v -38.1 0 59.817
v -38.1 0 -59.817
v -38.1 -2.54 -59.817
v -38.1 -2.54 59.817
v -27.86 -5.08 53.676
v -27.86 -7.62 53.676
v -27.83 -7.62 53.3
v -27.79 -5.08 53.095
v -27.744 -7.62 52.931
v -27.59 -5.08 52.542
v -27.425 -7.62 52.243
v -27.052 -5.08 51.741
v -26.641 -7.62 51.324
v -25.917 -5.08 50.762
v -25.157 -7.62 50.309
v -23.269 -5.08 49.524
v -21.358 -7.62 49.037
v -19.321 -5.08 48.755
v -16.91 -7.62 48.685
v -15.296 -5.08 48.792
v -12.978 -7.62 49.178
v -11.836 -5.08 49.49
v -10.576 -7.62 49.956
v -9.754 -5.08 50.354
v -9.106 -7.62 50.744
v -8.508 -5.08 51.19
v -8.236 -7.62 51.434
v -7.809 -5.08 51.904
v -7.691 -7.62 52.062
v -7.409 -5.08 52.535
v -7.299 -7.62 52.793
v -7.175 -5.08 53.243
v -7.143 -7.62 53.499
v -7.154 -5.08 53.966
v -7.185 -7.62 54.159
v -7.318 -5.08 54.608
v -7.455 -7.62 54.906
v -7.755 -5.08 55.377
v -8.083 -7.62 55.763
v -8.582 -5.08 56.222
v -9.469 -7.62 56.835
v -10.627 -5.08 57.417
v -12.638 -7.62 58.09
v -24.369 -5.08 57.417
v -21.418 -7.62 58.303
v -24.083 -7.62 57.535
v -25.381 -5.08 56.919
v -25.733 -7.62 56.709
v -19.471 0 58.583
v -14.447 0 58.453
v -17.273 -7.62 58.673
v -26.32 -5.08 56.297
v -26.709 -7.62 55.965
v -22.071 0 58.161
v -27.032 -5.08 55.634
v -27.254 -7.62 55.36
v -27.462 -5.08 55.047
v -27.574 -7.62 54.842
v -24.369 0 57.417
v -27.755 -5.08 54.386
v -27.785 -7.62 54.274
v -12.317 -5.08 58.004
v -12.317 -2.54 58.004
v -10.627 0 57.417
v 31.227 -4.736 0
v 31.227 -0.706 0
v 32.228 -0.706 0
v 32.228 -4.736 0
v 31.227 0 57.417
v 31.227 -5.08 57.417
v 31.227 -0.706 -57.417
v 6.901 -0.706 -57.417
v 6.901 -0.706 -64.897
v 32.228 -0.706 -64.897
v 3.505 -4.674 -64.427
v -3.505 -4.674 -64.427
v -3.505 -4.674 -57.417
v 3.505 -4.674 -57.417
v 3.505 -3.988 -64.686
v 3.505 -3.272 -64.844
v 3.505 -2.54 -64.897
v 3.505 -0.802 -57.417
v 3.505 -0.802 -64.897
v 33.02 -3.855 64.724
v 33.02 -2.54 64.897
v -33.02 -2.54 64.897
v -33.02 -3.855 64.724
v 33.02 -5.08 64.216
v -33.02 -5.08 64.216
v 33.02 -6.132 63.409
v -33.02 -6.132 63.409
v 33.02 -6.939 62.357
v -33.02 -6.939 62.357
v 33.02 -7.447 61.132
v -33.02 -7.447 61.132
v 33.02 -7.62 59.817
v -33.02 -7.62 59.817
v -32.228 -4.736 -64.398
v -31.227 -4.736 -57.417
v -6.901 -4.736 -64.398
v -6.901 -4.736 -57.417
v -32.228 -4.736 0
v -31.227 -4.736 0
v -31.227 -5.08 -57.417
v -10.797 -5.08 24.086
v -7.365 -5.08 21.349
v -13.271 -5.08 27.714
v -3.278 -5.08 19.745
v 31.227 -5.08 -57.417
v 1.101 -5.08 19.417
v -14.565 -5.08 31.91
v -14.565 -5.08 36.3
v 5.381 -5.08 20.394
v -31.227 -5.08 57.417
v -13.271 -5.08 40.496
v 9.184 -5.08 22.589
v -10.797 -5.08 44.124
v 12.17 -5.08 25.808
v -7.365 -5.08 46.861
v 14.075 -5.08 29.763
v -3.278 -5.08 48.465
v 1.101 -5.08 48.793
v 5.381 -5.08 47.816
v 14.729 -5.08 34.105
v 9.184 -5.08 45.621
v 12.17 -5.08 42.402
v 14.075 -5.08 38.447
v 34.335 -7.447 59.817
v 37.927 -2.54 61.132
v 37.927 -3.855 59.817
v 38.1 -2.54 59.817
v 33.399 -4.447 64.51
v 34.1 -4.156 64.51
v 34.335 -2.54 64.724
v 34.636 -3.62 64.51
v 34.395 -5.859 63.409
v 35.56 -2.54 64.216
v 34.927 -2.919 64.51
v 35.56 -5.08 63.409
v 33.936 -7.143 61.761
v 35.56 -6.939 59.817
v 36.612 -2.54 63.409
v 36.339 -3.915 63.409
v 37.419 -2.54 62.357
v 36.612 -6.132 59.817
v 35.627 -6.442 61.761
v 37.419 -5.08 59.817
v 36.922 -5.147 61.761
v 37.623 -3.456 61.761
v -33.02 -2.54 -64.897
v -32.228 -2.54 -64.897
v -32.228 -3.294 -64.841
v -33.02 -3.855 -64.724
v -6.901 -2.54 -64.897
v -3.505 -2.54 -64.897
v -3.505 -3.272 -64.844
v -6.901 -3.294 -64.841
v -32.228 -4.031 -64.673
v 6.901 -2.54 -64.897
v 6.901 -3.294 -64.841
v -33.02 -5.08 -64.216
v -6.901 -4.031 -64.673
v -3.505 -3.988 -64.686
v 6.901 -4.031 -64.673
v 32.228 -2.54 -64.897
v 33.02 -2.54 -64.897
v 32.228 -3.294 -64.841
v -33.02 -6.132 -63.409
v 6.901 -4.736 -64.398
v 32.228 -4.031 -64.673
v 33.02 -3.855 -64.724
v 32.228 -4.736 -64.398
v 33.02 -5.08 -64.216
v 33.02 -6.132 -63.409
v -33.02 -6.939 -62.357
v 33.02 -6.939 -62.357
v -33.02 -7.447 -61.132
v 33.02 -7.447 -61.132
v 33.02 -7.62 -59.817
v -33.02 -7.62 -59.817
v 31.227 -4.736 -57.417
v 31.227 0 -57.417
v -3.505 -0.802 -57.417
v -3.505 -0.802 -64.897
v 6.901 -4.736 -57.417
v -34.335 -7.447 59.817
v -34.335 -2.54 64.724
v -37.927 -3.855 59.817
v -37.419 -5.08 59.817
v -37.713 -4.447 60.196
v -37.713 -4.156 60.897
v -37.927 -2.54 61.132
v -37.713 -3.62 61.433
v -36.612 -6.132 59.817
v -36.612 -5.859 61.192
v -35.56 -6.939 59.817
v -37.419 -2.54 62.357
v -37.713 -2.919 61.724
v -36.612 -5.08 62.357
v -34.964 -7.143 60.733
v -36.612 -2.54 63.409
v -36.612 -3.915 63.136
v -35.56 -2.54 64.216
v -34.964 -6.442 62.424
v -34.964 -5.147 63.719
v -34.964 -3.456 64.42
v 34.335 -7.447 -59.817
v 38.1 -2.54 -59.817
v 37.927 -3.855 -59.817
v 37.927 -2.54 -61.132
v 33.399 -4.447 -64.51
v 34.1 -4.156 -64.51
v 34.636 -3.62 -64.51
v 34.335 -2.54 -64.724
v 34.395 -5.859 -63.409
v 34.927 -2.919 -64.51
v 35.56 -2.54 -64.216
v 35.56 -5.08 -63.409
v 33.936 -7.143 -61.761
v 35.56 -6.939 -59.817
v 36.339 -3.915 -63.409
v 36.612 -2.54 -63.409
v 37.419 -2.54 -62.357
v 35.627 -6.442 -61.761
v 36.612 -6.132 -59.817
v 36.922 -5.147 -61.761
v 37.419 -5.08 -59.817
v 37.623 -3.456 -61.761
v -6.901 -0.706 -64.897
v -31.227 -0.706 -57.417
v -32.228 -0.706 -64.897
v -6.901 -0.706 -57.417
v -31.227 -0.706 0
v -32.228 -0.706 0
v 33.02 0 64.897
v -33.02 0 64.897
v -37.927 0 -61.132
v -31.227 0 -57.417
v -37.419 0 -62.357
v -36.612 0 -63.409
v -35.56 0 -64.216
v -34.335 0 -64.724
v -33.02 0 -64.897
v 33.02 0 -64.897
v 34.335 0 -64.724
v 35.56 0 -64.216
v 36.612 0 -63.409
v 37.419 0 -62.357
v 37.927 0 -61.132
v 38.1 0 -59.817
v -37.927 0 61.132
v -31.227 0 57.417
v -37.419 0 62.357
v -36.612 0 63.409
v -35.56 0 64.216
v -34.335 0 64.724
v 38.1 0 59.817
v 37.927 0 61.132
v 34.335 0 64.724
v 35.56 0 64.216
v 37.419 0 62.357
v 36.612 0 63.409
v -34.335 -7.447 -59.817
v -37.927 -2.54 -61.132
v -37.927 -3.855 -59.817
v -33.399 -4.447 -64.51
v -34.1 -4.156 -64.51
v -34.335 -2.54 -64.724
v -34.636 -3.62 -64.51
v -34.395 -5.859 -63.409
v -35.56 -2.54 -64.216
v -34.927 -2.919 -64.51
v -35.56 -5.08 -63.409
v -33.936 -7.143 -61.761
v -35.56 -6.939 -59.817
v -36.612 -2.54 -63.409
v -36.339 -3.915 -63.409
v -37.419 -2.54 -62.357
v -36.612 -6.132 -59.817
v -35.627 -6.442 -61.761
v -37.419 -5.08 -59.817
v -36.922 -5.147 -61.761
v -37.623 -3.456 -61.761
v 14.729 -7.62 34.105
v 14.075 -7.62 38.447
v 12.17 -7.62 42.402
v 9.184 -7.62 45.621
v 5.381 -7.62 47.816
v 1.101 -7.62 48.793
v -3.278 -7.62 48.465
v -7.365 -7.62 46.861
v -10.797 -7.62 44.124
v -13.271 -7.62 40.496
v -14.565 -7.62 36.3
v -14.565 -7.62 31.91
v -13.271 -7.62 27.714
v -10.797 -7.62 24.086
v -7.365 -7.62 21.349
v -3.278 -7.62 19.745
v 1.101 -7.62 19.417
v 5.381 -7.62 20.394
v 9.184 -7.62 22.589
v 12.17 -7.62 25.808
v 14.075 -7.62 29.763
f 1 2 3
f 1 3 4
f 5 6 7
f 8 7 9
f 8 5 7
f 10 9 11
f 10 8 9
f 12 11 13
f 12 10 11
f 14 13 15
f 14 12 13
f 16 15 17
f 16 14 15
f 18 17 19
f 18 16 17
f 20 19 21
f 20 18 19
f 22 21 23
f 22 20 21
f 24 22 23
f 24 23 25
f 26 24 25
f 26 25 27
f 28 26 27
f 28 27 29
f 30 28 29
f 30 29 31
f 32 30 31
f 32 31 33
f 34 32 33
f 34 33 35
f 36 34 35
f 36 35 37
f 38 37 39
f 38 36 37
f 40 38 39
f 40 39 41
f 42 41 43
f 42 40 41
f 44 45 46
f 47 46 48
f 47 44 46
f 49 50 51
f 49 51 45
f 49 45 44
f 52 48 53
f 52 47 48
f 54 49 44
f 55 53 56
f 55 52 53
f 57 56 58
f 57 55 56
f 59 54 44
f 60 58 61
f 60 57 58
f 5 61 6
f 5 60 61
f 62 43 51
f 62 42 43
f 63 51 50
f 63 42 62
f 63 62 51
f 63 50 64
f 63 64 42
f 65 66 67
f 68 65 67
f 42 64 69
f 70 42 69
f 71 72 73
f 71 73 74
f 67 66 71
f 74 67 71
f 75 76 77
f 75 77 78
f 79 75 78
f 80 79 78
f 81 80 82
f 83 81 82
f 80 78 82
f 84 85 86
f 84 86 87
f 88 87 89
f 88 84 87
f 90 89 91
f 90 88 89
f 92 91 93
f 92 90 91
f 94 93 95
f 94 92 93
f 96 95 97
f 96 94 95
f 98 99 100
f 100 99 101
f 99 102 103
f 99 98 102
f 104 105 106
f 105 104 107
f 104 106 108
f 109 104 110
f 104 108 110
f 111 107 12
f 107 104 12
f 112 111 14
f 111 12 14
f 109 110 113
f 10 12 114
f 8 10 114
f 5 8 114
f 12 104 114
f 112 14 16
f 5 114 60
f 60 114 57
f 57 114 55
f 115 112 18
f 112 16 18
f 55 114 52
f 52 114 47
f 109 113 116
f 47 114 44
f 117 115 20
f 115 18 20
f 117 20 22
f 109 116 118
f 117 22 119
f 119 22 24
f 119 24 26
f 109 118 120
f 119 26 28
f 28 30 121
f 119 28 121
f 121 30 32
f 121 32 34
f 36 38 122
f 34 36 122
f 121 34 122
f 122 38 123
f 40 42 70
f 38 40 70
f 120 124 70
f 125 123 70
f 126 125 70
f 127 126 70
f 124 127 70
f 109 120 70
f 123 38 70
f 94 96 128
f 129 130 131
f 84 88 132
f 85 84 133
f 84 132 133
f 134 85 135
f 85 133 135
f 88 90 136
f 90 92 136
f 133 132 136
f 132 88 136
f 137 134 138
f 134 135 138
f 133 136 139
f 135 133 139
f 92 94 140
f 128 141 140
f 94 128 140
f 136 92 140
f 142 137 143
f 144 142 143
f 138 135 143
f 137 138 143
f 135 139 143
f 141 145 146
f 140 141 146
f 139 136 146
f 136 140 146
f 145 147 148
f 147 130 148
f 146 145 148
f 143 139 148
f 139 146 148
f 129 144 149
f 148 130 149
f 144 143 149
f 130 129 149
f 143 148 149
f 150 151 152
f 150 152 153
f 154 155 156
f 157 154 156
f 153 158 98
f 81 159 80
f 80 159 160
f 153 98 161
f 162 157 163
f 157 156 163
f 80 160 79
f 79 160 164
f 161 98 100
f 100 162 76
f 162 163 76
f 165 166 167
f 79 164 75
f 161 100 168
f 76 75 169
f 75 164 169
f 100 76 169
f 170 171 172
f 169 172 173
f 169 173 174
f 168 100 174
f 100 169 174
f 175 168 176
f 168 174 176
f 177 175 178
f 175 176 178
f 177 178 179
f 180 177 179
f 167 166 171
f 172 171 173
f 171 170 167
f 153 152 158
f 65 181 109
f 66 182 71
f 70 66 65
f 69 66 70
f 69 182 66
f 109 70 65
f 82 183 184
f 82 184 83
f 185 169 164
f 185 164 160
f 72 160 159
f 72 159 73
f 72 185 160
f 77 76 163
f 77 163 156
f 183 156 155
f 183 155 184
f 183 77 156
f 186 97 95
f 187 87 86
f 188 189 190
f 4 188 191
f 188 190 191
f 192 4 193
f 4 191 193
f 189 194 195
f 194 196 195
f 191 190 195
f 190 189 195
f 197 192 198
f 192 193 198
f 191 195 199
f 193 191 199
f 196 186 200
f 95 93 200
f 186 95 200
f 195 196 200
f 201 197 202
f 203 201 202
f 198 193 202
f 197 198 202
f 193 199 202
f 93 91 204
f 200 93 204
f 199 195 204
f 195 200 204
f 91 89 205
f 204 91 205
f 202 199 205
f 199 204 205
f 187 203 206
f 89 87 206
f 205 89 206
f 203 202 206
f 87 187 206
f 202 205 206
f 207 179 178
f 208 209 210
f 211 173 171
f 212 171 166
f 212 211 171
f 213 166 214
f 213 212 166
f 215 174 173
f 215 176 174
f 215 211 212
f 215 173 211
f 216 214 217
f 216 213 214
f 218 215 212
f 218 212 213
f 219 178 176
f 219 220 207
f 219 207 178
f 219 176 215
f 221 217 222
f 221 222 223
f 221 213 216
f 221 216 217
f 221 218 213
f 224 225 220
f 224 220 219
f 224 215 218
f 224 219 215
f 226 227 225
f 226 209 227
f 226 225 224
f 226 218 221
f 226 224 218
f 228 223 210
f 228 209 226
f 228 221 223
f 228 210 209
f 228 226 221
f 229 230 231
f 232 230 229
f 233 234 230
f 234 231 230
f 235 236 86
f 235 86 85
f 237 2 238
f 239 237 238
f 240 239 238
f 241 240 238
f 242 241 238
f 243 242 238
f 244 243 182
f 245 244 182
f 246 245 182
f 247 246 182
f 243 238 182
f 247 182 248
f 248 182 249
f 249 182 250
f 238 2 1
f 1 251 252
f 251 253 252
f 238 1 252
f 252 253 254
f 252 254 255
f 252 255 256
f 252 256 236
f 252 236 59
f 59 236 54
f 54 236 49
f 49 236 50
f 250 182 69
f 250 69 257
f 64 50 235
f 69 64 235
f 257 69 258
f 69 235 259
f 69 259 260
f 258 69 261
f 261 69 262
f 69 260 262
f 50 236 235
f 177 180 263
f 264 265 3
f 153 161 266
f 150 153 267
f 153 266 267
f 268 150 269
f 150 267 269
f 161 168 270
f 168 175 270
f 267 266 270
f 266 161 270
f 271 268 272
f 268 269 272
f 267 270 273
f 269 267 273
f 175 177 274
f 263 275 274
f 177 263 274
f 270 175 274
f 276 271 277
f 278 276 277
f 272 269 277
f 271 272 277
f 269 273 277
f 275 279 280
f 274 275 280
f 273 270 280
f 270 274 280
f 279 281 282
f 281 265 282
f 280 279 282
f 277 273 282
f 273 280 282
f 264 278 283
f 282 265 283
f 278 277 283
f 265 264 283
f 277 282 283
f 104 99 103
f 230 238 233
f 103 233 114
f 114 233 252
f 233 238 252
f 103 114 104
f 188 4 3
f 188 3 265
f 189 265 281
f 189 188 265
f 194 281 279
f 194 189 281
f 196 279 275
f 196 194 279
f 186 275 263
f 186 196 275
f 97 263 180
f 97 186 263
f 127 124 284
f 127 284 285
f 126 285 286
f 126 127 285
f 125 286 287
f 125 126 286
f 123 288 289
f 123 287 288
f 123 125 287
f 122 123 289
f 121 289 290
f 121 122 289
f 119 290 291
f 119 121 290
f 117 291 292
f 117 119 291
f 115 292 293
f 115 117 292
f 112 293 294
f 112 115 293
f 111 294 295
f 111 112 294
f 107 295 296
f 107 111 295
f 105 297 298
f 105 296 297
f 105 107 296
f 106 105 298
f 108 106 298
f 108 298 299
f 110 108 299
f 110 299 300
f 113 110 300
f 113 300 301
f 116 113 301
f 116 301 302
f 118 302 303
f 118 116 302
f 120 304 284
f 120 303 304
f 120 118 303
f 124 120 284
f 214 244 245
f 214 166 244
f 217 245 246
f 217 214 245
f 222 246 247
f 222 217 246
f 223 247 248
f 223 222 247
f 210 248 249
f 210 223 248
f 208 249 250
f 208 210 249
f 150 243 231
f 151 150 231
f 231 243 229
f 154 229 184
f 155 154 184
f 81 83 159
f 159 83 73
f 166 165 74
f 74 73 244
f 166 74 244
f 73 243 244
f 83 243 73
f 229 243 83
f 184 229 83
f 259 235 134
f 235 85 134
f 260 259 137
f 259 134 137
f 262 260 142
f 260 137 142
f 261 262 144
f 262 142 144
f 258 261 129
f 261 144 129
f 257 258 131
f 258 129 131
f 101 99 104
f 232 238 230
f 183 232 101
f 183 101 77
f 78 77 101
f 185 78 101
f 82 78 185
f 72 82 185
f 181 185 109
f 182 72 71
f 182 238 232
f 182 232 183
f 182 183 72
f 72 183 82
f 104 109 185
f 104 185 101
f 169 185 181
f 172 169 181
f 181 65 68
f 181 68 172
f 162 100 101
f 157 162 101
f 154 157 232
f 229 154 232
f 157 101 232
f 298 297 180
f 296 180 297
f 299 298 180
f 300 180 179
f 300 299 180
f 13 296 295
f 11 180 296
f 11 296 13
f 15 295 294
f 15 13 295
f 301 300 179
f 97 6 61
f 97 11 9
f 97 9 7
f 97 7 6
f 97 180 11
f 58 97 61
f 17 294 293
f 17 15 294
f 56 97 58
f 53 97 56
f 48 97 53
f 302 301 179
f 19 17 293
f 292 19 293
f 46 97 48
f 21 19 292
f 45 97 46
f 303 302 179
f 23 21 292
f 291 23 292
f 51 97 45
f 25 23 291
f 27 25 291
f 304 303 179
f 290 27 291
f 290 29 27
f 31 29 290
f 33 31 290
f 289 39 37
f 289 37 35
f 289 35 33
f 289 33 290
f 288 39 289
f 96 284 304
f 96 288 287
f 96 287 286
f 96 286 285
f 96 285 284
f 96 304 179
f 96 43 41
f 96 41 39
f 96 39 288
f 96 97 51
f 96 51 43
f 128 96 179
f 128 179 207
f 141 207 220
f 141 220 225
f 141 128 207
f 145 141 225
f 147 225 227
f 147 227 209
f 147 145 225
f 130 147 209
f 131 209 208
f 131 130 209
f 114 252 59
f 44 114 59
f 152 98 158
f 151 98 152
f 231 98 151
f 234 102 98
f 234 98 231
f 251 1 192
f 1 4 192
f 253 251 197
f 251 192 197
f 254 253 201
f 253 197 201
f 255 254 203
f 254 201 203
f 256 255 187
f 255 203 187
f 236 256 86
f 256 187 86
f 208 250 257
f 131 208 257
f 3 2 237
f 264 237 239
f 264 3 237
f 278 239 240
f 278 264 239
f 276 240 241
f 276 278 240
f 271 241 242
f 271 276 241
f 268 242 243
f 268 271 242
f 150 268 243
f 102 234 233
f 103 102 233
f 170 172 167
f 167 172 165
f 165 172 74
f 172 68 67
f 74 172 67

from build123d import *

# Parameters (mm, degrees)
F0_W      = 76.2
F0_H      = 129.794
F1_DEPTH  = 7.62
F2_W      = 62.453852
F2_H      = 114.834502
F3_DEPTH  = 5.08
F4_R      = 5.08
F5_R      = 14.729499
F6_DEPTH  = 7.621
F7_W      = 25.326907
F7_H      = 4.029281
F7_W_2    = 7.00929
F7_H_2    = 3.872237
F8_DEPTH  = 64.898
F10_DEPTH = 7.621


with BuildPart() as f1:
    # F0 (on Front) → F1 (new body)
    with BuildSketch(Plane.XZ):
        Rectangle(F0_W, F0_H)
    extrude(amount=F1_DEPTH)

    # F2 (on Front) → F3 (cut)
    with BuildSketch(Plane.XZ):
        Rectangle(F2_W, F2_H)
    extrude(amount=F3_DEPTH, mode=Mode.SUBTRACT)

    # F4
    f4_edges = [f1.edges().sort_by_distance(p)[0] for p in [
        (38.1, -7.62, 0),
        (0, -7.62, 64.897),
        (-38.1, -7.62, 0),
        (0, -7.62, -64.897),
        (-38.1, -3.81, -64.897),
        (38.1, -3.81, -64.897),
        (-38.1, -3.81, 64.897),
        (38.1, -3.81, 64.897),
    ]]
    fillet(f4_edges, radius=F4_R)

    # F5 (on Front) → F6 (cut, through all)
    with BuildSketch(Plane.XZ):
        with Locations((0, 34.104981)):
            Circle(F5_R)
    extrude(amount=F6_DEPTH, mode=Mode.SUBTRACT)

    # F7 (on Top) → F8 (cut, through all)
    with BuildSketch(Plane.XY):
        with Locations((-19.564182, -2.721094)):
            Rectangle(F7_W, F7_H)
        with Locations((19.564182, -2.721094)):
            Rectangle(F7_W, F7_H)
        with Locations((0, -2.737844)):
            Rectangle(F7_W_2, F7_H_2)
    extrude(amount=-F8_DEPTH, mode=Mode.SUBTRACT)

    # F9 (on Front) → F10 (cut, through all)
    with BuildSketch(Plane.XZ):
        with BuildLine():
            add(Edge.make_bspline(
                [(-27.859751, 53.675774), (-27.859751, 45.018395), (-12.31697, 49.347085), (3.225811, 53.675774), (-12.31697, 58.004464), (-27.859751, 62.333154), (-27.859751, 53.675774)],
                knots=[0, 0, 0, 2.094395, 2.094395, 4.18879, 4.18879, 6.283185, 6.283185, 6.283185], degree=2, weights=[1, 0.5, 1, 0.5, 1, 0.5, 1]))
        make_face()
    extrude(amount=F10_DEPTH, mode=Mode.SUBTRACT)


solid = f1.part
